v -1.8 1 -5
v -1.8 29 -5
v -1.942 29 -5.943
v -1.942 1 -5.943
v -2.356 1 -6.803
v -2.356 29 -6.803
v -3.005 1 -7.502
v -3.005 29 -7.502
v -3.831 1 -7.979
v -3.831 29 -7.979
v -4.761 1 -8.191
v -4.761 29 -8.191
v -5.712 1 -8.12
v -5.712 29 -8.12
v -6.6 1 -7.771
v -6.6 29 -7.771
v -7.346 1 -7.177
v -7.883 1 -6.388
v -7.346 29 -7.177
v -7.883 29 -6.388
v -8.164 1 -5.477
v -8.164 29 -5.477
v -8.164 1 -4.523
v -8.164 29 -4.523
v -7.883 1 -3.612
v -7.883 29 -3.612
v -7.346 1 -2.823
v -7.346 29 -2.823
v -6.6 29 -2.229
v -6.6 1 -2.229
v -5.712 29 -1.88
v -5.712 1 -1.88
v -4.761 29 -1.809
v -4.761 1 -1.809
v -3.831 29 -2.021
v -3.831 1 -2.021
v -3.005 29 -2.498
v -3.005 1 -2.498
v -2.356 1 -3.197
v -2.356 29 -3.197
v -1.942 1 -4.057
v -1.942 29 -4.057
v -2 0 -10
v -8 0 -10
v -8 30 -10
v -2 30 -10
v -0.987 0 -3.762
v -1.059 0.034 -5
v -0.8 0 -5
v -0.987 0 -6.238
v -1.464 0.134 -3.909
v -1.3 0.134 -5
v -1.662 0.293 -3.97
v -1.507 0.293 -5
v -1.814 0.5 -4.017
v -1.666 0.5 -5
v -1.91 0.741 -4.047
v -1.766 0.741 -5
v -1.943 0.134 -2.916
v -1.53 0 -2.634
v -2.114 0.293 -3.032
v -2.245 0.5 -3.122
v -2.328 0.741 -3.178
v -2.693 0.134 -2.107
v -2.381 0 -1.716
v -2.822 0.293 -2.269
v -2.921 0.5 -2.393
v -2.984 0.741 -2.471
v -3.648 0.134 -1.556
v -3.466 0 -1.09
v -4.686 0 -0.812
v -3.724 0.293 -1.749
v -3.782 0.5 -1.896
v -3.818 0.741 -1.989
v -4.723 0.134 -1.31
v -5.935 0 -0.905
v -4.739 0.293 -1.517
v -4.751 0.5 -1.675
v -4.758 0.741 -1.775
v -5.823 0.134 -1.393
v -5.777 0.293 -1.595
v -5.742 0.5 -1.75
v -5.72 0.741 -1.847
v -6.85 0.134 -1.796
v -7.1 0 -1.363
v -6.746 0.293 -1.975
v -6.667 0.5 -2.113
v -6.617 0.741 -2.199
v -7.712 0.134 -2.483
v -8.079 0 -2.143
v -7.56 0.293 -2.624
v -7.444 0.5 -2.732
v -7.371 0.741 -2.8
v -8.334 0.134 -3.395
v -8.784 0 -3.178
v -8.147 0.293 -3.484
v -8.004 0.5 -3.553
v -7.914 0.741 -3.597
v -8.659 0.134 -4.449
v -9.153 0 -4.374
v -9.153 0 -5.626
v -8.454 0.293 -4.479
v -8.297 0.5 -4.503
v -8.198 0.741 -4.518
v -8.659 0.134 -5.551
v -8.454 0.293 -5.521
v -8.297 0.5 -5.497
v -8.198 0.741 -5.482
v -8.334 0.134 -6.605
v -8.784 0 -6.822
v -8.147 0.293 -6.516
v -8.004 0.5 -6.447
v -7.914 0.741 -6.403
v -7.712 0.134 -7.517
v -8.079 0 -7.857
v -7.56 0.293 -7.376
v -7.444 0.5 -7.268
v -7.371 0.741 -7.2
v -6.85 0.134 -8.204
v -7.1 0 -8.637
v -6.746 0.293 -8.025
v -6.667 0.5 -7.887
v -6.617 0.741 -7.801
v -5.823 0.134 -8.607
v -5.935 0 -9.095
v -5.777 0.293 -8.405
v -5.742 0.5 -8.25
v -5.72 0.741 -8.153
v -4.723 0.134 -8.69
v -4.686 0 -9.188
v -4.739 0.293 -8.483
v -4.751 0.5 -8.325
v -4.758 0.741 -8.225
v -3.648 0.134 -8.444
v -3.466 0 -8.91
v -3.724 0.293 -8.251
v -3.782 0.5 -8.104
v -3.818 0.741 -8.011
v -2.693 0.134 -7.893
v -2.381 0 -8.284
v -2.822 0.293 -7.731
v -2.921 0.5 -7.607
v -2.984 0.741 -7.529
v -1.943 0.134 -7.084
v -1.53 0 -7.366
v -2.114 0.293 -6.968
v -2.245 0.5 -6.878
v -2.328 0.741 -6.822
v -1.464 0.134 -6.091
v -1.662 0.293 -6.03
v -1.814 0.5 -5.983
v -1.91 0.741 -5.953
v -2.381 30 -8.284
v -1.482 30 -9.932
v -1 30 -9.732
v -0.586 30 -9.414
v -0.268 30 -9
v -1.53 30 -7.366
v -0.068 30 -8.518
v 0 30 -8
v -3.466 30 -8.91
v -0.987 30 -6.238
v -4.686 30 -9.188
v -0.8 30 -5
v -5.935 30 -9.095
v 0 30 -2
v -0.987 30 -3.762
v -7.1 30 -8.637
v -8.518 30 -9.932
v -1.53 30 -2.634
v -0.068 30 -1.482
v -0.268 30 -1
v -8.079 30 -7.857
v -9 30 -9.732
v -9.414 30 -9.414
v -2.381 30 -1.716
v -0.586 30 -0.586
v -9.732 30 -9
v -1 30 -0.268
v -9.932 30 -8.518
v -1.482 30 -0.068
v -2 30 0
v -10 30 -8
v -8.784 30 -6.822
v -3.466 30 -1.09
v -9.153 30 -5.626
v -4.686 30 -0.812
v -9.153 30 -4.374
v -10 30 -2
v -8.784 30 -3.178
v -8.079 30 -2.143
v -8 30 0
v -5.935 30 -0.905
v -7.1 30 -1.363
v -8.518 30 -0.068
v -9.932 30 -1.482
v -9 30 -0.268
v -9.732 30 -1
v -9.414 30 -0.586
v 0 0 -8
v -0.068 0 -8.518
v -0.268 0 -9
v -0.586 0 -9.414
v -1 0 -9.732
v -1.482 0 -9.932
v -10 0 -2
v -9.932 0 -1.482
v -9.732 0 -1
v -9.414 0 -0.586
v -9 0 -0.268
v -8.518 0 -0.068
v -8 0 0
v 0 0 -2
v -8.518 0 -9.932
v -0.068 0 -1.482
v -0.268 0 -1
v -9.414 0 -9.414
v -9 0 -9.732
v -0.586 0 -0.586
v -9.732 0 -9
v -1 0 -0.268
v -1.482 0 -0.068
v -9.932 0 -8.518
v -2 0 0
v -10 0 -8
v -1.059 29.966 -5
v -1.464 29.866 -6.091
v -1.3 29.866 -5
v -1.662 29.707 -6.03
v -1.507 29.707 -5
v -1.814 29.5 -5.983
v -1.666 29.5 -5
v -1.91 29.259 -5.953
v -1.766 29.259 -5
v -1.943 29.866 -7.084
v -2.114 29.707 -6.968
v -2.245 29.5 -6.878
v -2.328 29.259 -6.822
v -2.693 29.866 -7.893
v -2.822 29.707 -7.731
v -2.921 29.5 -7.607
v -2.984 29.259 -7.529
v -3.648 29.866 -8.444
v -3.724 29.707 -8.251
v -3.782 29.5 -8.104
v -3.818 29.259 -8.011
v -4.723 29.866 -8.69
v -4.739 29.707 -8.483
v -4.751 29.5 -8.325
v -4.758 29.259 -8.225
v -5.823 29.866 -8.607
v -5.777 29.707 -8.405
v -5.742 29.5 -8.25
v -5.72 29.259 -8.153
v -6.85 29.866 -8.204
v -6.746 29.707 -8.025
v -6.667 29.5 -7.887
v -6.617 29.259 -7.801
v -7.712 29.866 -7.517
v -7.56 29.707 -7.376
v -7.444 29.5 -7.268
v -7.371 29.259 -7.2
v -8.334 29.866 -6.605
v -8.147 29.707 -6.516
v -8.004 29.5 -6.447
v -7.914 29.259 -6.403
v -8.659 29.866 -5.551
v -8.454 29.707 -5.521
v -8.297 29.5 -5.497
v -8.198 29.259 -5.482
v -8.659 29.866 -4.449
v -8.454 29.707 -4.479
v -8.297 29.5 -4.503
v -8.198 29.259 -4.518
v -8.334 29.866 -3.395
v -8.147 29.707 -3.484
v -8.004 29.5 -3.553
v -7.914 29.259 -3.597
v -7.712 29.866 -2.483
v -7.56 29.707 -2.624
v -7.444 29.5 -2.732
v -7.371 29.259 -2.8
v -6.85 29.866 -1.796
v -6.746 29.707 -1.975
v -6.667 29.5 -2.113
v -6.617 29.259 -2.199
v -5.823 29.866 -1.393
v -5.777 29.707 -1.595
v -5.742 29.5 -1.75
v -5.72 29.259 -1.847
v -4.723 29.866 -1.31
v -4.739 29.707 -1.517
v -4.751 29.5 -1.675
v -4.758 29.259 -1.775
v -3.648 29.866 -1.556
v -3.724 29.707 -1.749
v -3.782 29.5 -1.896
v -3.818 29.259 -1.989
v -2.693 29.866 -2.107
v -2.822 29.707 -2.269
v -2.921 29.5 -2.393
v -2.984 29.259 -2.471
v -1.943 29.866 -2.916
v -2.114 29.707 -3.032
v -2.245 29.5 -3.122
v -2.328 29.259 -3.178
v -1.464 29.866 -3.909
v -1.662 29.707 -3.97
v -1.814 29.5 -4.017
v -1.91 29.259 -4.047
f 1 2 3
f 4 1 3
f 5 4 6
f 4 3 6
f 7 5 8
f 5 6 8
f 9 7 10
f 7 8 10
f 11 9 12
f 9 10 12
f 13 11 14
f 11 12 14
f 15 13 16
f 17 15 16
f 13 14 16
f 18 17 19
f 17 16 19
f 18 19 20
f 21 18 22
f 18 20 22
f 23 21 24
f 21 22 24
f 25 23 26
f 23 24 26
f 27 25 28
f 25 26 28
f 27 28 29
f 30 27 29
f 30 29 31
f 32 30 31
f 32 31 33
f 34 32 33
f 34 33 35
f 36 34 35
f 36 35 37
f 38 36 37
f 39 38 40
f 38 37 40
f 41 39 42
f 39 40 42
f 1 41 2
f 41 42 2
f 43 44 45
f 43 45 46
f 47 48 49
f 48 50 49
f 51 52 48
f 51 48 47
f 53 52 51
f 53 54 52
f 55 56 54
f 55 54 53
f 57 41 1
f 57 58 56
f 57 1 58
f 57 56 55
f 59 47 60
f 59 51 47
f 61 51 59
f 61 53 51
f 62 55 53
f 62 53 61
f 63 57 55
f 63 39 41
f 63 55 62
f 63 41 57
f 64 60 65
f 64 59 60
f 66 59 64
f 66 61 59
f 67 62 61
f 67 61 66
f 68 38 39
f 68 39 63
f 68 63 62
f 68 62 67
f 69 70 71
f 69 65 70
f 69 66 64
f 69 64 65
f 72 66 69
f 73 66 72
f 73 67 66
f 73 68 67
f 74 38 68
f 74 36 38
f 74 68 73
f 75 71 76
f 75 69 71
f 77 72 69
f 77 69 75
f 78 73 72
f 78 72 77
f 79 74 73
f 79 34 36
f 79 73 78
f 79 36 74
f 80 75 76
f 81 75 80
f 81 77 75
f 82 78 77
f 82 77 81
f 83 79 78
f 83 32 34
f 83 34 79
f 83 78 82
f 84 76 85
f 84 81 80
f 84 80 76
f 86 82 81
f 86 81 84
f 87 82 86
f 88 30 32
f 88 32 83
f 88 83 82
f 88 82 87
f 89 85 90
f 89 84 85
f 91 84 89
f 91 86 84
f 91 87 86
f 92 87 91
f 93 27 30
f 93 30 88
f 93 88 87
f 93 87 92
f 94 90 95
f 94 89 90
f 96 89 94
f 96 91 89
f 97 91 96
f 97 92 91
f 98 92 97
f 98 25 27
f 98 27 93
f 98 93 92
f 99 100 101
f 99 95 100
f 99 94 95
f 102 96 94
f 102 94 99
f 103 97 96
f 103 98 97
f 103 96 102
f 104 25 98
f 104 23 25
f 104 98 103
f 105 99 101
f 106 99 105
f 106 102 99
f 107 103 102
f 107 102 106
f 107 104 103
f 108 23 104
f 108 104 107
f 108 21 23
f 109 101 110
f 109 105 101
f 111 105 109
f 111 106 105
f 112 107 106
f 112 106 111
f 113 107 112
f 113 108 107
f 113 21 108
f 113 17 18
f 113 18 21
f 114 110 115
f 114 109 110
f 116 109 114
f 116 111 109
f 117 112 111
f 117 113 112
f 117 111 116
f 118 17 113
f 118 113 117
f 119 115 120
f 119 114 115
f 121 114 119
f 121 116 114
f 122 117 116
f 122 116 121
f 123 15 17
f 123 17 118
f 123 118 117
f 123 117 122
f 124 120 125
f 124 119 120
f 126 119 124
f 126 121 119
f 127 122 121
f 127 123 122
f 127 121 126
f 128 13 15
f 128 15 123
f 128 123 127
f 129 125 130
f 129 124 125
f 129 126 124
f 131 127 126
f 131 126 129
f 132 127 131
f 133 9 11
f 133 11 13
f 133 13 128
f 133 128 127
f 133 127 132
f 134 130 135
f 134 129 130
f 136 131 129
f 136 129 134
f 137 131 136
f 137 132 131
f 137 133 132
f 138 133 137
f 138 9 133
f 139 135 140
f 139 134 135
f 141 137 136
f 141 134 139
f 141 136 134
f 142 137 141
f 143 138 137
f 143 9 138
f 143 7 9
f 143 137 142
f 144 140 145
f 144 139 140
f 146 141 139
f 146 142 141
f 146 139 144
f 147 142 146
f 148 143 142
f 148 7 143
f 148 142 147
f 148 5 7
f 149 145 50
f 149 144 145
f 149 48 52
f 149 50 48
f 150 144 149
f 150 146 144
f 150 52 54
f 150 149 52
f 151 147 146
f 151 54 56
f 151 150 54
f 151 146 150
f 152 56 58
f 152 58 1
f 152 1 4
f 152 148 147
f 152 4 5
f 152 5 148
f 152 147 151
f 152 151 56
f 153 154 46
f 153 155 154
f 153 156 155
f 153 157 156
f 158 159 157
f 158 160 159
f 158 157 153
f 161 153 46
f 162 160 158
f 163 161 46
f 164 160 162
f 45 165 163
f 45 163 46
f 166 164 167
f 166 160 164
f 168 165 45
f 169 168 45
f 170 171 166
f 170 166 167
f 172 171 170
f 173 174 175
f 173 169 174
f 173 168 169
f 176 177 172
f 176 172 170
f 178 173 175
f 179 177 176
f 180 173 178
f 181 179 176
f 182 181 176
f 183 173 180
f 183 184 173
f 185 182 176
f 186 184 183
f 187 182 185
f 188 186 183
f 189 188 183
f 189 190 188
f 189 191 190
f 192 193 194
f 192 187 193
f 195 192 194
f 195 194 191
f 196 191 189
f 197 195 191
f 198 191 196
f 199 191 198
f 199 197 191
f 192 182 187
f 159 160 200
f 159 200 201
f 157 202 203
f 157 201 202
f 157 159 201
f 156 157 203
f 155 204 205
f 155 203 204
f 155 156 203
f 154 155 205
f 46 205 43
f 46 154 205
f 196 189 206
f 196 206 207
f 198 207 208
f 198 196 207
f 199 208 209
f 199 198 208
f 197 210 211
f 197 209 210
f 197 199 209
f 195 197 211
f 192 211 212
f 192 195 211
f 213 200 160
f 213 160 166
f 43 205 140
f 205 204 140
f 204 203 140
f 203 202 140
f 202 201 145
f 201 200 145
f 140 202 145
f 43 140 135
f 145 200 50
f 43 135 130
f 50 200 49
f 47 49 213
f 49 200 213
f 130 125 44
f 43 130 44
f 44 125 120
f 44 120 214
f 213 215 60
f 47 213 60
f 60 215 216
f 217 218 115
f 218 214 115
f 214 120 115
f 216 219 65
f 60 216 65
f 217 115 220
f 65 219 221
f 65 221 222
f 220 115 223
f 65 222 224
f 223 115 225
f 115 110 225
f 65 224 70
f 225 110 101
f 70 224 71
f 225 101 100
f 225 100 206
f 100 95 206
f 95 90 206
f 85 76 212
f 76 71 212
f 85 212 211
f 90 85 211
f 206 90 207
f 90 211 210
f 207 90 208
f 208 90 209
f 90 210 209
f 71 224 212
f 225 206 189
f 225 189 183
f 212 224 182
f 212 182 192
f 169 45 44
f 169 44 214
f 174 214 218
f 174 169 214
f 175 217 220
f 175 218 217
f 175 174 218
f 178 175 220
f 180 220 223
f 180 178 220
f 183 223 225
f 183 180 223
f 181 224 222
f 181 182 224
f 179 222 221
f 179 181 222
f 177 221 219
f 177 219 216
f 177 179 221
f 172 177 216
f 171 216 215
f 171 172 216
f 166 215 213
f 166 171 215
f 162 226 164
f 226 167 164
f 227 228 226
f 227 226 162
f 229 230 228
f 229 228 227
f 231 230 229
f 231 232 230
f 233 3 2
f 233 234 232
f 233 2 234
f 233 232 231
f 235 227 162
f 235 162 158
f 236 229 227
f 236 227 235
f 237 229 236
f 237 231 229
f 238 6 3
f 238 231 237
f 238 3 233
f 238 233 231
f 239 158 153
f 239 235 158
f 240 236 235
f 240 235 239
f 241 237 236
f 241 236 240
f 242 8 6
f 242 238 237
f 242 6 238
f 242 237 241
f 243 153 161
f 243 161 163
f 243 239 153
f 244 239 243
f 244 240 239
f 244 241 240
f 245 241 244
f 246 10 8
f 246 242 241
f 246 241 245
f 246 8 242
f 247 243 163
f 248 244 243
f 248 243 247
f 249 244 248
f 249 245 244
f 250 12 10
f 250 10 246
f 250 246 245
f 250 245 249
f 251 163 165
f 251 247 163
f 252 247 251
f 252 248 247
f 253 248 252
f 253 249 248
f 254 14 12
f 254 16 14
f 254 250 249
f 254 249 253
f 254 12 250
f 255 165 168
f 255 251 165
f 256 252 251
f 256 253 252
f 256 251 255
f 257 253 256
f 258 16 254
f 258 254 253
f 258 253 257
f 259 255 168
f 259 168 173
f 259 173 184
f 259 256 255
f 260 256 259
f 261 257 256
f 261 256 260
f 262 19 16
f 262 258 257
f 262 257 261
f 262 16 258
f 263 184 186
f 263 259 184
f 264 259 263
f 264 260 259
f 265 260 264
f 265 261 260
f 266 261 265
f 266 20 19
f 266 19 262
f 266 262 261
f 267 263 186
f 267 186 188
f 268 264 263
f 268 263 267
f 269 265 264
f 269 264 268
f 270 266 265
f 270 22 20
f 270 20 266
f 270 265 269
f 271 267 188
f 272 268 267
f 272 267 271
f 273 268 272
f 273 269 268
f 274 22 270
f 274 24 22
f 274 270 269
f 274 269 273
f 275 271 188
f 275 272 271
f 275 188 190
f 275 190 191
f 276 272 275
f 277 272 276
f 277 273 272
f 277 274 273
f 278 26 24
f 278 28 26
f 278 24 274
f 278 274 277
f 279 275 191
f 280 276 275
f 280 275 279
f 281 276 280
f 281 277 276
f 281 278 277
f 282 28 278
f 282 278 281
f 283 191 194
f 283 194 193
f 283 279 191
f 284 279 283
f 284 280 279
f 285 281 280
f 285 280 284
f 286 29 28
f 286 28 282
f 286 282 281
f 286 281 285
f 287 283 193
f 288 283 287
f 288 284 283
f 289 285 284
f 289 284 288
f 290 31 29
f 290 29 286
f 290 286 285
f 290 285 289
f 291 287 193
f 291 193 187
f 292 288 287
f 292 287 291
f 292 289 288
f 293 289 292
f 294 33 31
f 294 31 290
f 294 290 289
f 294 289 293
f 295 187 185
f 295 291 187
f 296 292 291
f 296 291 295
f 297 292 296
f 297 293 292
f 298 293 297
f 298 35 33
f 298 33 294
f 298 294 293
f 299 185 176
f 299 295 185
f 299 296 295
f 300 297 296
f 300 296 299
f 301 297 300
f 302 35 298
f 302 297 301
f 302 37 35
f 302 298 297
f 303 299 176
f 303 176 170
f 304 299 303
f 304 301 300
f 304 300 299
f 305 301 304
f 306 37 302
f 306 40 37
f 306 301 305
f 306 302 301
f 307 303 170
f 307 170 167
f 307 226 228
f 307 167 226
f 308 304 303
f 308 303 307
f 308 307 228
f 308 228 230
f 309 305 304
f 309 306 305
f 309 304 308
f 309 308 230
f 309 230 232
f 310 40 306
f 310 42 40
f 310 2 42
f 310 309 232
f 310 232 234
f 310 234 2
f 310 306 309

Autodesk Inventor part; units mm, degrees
ref_plane "YZ Plane" through (0, 0, 0) normal (1, 0, 0) x (0, 1, 0)
ref_plane "XZ Plane" through (0, 0, 0) normal (0, 1, 0) x (-1, 0, 0)
ref_plane "XY Plane" through (0, 0, 0) normal (0, 0, 1) x (1, 0, 0)
sketch "Sketch1" plane through (0, 0, 0) normal (0, 1, 0) x (-1, 0, 0)
  line L0 (0, 0) -> (10, 0)
  line L1 (10, 0) -> (10, -10)
  line L2 (10, -10) -> (0, -10)
  line L3 (0, -10) -> (0, 0)
  dimension "d0" = 10
  dimension "d1" = 10
extrude "Extrusion1" add sketch "Sketch1" along normal blind 30
fillet "Fillet1" radius 2 4 edges at (0, 15, 0) (0, 15, -10) (-10, 15, 0) (-10, 15, -10)
sketch "Sketch2" plane through (0, 30, 0) normal (0, 1, 0) x (1, 0, 0)
  circle A0 centre (-5, 5) radius 3.2
  line L0 (-8, 0) -> (-2, 0) projected
  line L1 (-10, 8) -> (-10, 2) projected
  point P0 (0, 0)
  dimension "d5" = 6.4
  dimension "d6" = 5
  dimension "d7" = 5
extrude "Extrusion2" cut sketch "Sketch2" against normal through all
fillet "Fillet2" radius 1 2 edges at (-8.2, 30, -5) (-8.2, 0, -5)
properties part number "30mm_HeatInsertSpacer"
